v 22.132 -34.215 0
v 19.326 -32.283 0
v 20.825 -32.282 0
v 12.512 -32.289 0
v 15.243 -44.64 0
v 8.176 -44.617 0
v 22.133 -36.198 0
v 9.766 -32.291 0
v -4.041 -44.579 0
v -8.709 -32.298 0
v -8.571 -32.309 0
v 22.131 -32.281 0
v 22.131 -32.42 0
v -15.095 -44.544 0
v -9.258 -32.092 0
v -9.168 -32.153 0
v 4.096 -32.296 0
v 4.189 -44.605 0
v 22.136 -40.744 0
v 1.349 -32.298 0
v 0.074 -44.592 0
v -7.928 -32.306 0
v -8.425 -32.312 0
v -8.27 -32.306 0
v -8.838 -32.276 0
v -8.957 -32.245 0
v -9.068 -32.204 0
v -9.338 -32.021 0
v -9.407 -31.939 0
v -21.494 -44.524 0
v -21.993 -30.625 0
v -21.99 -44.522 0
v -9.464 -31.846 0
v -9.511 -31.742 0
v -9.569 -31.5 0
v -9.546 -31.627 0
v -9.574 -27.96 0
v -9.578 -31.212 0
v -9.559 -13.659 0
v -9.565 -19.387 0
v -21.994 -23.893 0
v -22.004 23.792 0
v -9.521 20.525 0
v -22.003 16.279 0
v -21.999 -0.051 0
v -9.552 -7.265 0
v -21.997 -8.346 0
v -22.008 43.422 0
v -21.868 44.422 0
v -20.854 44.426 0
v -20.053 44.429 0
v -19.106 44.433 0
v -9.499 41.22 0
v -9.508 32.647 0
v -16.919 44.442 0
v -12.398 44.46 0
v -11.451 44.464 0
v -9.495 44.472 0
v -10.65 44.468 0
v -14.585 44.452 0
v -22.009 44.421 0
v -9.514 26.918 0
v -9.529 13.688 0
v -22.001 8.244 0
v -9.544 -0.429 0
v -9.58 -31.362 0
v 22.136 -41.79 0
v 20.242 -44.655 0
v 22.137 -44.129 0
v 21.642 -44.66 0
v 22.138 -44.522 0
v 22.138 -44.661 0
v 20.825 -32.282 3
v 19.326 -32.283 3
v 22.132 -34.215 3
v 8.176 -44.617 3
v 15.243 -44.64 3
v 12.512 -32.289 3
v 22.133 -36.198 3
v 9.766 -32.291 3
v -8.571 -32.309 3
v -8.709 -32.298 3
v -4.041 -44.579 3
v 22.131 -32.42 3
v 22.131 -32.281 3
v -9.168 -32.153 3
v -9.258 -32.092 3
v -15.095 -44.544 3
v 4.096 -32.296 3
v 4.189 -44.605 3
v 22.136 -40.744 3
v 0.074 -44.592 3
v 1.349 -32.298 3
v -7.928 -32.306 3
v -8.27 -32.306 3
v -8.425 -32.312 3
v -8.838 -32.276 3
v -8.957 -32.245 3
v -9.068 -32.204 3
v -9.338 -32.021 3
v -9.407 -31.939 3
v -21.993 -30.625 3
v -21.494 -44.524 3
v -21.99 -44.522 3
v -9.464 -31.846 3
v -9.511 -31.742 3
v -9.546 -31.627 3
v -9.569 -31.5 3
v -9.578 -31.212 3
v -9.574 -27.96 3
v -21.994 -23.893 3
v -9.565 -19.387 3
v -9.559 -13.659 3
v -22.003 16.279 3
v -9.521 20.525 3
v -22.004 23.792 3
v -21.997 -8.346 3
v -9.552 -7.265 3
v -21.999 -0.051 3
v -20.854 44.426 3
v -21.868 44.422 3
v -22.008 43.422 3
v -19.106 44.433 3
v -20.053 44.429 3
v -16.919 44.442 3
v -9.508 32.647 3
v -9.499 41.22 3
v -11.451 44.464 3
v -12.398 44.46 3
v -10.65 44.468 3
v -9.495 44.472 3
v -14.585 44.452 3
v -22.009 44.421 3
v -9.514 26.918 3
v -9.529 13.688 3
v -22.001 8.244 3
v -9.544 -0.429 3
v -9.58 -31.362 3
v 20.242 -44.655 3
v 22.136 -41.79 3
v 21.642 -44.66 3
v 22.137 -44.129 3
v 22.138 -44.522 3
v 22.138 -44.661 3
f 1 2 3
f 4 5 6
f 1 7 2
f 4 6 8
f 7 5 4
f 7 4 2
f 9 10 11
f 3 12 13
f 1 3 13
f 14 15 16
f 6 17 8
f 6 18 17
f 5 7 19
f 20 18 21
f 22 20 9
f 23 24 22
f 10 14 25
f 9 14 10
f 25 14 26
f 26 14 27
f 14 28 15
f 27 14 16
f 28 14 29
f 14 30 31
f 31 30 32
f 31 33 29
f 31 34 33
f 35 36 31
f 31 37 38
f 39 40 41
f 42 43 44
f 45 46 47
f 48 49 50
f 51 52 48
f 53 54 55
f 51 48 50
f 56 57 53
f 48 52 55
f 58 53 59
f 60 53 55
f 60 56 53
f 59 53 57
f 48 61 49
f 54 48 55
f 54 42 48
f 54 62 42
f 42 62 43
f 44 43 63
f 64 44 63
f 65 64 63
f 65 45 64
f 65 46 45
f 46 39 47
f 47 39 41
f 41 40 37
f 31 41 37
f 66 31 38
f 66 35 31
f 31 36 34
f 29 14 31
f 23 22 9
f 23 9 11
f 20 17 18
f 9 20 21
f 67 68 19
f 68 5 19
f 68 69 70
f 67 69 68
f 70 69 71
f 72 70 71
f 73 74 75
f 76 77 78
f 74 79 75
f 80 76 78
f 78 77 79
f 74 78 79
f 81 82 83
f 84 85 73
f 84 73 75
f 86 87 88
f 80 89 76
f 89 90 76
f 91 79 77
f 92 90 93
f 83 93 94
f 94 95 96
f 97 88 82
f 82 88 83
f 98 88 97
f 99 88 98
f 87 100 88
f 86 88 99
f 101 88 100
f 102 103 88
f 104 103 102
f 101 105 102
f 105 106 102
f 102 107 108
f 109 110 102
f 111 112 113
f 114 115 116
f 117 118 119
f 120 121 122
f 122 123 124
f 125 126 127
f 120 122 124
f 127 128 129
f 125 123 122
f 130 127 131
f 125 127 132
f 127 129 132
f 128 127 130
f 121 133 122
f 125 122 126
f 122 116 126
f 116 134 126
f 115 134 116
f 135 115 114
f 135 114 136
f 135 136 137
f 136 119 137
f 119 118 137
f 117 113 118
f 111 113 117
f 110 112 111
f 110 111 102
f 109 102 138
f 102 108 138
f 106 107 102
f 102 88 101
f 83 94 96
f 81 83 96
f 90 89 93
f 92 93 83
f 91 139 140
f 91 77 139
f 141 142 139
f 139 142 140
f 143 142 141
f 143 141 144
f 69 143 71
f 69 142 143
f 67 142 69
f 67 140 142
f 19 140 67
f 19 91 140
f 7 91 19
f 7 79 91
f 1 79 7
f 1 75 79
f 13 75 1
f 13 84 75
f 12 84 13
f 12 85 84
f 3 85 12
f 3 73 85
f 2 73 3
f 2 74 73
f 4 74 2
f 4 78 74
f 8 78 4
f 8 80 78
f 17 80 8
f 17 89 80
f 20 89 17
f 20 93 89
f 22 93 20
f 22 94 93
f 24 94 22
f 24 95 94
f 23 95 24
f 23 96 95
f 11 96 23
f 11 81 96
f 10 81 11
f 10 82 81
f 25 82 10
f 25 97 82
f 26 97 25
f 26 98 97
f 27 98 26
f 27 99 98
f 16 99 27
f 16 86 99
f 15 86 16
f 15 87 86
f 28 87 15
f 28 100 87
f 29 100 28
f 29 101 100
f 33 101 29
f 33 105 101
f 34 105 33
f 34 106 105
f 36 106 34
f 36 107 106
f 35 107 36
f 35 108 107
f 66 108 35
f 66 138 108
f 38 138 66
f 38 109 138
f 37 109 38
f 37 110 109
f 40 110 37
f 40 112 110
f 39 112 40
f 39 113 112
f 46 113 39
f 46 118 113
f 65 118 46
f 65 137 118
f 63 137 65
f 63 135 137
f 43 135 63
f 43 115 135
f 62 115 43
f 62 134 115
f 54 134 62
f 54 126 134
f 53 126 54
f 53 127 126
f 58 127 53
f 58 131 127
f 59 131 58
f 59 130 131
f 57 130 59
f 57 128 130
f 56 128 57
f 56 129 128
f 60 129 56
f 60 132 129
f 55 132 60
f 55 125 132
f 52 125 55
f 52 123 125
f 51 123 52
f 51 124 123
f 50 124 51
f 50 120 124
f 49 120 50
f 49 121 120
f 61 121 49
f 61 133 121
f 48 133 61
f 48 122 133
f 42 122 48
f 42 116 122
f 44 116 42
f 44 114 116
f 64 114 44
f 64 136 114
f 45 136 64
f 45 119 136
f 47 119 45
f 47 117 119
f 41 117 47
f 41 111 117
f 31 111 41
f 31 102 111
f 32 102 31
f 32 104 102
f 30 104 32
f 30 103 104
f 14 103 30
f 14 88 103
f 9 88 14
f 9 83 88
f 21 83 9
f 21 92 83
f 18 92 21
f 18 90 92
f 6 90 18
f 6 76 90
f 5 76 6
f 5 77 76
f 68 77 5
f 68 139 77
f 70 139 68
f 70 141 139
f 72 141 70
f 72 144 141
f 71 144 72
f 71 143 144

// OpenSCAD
// Generated from 交通部公路局（原交通部公路總局）「新式號牌使用之英文字、數字字體」author trace
fudge = 0.1;

module glyph_2012_L(h = 3) {
  difference() {
    linear_extrude(height = h)
      polygon(points = [[-22.0087, 44.4213], [-22.0084, 43.4224], [-22.0078, 40.5995], [-22.0069, 36.2131], [-22.0057, 30.5238], [-22.0043, 23.7922], [-22.0026, 16.2789], [-22.0009, 8.2445], [-21.9992, -0.0506], [-21.9974, -8.3456], [-21.9957, -16.3801], [-21.9941, -23.8934], [-21.9926, -30.625], [-21.9914, -36.3143], [-21.9905, -40.7007], [-21.9899, -43.5236], [-21.9897, -44.5225], [-21.4941, -44.524], [-20.0936, -44.5284], [-17.9174, -44.5353], [-15.0948, -44.5442], [-11.755, -44.5547], [-8.0275, -44.5664], [-4.0413, -44.5789], [0.0741, -44.5919], [4.1895, -44.6048], [8.1756, -44.6174], [11.9032, -44.6291], [15.2429, -44.6396], [18.0655, -44.6485], [20.2417, -44.6554], [21.6423, -44.6598], [22.1378, -44.6613], [22.1378, -44.5223], [22.1375, -44.1294], [22.1372, -43.5188], [22.1368, -42.7269], [22.1363, -41.7899], [22.1358, -40.7441], [22.1352, -39.6257], [22.1346, -38.4711], [22.134, -37.3165], [22.1334, -36.1982], [22.1328, -35.1524], [22.1323, -34.2154], [22.1319, -33.4235], [22.1316, -32.8129], [22.1314, -32.42], [22.1313, -32.2809], [21.7899, -32.2812], [20.825, -32.282], [19.3258, -32.2832], [17.3812, -32.2848], [15.0803, -32.2867], [12.5123, -32.2888], [9.7661, -32.2911], [6.9308, -32.2934], [4.0956, -32.2957], [1.3494, -32.298], [-1.2187, -32.3001], [-3.5195, -32.302], [-5.4641, -32.3036], [-6.9634, -32.3048], [-7.9283, -32.3056], [-8.2697, -32.3058], [-8.4246, -32.3122], [-8.5711, -32.3095], [-8.709, -32.2976], [-8.8379, -32.2762], [-8.9575, -32.2452], [-9.0677, -32.2044], [-9.1679, -32.1535], [-9.258, -32.0924], [-9.3377, -32.0209], [-9.4066, -31.9388], [-9.4645, -31.8459], [-9.511, -31.742], [-9.5459, -31.6269], [-9.5689, -31.5004], [-9.5796, -31.3623], [-9.5778, -31.2125], [-9.5769, -30.3625], [-9.5743, -27.9604], [-9.5702, -24.2279], [-9.5649, -19.3867], [-9.5587, -13.6587], [-9.5517, -7.2654], [-9.5443, -0.4286], [-9.5366, 6.6299], [-9.5289, 13.6884], [-9.5215, 20.5252], [-9.5145, 26.9185], [-9.5083, 32.6466], [-9.503, 37.4877], [-9.4989, 41.2202], [-9.4963, 43.6223], [-9.4954, 44.4723], [-9.6359, 44.4717], [-10.0331, 44.4701], [-10.6502, 44.4676], [-11.4506, 44.4643], [-12.3976, 44.4605], [-13.4547, 44.4562], [-14.585, 44.4516], [-15.752, 44.4468], [-16.919, 44.442], [-18.0494, 44.4374], [-19.1064, 44.4331], [-20.0535, 44.4293], [-20.8539, 44.426], [-21.471, 44.4235], [-21.8681, 44.4219]]);
  }
}

glyph_2012_L();
